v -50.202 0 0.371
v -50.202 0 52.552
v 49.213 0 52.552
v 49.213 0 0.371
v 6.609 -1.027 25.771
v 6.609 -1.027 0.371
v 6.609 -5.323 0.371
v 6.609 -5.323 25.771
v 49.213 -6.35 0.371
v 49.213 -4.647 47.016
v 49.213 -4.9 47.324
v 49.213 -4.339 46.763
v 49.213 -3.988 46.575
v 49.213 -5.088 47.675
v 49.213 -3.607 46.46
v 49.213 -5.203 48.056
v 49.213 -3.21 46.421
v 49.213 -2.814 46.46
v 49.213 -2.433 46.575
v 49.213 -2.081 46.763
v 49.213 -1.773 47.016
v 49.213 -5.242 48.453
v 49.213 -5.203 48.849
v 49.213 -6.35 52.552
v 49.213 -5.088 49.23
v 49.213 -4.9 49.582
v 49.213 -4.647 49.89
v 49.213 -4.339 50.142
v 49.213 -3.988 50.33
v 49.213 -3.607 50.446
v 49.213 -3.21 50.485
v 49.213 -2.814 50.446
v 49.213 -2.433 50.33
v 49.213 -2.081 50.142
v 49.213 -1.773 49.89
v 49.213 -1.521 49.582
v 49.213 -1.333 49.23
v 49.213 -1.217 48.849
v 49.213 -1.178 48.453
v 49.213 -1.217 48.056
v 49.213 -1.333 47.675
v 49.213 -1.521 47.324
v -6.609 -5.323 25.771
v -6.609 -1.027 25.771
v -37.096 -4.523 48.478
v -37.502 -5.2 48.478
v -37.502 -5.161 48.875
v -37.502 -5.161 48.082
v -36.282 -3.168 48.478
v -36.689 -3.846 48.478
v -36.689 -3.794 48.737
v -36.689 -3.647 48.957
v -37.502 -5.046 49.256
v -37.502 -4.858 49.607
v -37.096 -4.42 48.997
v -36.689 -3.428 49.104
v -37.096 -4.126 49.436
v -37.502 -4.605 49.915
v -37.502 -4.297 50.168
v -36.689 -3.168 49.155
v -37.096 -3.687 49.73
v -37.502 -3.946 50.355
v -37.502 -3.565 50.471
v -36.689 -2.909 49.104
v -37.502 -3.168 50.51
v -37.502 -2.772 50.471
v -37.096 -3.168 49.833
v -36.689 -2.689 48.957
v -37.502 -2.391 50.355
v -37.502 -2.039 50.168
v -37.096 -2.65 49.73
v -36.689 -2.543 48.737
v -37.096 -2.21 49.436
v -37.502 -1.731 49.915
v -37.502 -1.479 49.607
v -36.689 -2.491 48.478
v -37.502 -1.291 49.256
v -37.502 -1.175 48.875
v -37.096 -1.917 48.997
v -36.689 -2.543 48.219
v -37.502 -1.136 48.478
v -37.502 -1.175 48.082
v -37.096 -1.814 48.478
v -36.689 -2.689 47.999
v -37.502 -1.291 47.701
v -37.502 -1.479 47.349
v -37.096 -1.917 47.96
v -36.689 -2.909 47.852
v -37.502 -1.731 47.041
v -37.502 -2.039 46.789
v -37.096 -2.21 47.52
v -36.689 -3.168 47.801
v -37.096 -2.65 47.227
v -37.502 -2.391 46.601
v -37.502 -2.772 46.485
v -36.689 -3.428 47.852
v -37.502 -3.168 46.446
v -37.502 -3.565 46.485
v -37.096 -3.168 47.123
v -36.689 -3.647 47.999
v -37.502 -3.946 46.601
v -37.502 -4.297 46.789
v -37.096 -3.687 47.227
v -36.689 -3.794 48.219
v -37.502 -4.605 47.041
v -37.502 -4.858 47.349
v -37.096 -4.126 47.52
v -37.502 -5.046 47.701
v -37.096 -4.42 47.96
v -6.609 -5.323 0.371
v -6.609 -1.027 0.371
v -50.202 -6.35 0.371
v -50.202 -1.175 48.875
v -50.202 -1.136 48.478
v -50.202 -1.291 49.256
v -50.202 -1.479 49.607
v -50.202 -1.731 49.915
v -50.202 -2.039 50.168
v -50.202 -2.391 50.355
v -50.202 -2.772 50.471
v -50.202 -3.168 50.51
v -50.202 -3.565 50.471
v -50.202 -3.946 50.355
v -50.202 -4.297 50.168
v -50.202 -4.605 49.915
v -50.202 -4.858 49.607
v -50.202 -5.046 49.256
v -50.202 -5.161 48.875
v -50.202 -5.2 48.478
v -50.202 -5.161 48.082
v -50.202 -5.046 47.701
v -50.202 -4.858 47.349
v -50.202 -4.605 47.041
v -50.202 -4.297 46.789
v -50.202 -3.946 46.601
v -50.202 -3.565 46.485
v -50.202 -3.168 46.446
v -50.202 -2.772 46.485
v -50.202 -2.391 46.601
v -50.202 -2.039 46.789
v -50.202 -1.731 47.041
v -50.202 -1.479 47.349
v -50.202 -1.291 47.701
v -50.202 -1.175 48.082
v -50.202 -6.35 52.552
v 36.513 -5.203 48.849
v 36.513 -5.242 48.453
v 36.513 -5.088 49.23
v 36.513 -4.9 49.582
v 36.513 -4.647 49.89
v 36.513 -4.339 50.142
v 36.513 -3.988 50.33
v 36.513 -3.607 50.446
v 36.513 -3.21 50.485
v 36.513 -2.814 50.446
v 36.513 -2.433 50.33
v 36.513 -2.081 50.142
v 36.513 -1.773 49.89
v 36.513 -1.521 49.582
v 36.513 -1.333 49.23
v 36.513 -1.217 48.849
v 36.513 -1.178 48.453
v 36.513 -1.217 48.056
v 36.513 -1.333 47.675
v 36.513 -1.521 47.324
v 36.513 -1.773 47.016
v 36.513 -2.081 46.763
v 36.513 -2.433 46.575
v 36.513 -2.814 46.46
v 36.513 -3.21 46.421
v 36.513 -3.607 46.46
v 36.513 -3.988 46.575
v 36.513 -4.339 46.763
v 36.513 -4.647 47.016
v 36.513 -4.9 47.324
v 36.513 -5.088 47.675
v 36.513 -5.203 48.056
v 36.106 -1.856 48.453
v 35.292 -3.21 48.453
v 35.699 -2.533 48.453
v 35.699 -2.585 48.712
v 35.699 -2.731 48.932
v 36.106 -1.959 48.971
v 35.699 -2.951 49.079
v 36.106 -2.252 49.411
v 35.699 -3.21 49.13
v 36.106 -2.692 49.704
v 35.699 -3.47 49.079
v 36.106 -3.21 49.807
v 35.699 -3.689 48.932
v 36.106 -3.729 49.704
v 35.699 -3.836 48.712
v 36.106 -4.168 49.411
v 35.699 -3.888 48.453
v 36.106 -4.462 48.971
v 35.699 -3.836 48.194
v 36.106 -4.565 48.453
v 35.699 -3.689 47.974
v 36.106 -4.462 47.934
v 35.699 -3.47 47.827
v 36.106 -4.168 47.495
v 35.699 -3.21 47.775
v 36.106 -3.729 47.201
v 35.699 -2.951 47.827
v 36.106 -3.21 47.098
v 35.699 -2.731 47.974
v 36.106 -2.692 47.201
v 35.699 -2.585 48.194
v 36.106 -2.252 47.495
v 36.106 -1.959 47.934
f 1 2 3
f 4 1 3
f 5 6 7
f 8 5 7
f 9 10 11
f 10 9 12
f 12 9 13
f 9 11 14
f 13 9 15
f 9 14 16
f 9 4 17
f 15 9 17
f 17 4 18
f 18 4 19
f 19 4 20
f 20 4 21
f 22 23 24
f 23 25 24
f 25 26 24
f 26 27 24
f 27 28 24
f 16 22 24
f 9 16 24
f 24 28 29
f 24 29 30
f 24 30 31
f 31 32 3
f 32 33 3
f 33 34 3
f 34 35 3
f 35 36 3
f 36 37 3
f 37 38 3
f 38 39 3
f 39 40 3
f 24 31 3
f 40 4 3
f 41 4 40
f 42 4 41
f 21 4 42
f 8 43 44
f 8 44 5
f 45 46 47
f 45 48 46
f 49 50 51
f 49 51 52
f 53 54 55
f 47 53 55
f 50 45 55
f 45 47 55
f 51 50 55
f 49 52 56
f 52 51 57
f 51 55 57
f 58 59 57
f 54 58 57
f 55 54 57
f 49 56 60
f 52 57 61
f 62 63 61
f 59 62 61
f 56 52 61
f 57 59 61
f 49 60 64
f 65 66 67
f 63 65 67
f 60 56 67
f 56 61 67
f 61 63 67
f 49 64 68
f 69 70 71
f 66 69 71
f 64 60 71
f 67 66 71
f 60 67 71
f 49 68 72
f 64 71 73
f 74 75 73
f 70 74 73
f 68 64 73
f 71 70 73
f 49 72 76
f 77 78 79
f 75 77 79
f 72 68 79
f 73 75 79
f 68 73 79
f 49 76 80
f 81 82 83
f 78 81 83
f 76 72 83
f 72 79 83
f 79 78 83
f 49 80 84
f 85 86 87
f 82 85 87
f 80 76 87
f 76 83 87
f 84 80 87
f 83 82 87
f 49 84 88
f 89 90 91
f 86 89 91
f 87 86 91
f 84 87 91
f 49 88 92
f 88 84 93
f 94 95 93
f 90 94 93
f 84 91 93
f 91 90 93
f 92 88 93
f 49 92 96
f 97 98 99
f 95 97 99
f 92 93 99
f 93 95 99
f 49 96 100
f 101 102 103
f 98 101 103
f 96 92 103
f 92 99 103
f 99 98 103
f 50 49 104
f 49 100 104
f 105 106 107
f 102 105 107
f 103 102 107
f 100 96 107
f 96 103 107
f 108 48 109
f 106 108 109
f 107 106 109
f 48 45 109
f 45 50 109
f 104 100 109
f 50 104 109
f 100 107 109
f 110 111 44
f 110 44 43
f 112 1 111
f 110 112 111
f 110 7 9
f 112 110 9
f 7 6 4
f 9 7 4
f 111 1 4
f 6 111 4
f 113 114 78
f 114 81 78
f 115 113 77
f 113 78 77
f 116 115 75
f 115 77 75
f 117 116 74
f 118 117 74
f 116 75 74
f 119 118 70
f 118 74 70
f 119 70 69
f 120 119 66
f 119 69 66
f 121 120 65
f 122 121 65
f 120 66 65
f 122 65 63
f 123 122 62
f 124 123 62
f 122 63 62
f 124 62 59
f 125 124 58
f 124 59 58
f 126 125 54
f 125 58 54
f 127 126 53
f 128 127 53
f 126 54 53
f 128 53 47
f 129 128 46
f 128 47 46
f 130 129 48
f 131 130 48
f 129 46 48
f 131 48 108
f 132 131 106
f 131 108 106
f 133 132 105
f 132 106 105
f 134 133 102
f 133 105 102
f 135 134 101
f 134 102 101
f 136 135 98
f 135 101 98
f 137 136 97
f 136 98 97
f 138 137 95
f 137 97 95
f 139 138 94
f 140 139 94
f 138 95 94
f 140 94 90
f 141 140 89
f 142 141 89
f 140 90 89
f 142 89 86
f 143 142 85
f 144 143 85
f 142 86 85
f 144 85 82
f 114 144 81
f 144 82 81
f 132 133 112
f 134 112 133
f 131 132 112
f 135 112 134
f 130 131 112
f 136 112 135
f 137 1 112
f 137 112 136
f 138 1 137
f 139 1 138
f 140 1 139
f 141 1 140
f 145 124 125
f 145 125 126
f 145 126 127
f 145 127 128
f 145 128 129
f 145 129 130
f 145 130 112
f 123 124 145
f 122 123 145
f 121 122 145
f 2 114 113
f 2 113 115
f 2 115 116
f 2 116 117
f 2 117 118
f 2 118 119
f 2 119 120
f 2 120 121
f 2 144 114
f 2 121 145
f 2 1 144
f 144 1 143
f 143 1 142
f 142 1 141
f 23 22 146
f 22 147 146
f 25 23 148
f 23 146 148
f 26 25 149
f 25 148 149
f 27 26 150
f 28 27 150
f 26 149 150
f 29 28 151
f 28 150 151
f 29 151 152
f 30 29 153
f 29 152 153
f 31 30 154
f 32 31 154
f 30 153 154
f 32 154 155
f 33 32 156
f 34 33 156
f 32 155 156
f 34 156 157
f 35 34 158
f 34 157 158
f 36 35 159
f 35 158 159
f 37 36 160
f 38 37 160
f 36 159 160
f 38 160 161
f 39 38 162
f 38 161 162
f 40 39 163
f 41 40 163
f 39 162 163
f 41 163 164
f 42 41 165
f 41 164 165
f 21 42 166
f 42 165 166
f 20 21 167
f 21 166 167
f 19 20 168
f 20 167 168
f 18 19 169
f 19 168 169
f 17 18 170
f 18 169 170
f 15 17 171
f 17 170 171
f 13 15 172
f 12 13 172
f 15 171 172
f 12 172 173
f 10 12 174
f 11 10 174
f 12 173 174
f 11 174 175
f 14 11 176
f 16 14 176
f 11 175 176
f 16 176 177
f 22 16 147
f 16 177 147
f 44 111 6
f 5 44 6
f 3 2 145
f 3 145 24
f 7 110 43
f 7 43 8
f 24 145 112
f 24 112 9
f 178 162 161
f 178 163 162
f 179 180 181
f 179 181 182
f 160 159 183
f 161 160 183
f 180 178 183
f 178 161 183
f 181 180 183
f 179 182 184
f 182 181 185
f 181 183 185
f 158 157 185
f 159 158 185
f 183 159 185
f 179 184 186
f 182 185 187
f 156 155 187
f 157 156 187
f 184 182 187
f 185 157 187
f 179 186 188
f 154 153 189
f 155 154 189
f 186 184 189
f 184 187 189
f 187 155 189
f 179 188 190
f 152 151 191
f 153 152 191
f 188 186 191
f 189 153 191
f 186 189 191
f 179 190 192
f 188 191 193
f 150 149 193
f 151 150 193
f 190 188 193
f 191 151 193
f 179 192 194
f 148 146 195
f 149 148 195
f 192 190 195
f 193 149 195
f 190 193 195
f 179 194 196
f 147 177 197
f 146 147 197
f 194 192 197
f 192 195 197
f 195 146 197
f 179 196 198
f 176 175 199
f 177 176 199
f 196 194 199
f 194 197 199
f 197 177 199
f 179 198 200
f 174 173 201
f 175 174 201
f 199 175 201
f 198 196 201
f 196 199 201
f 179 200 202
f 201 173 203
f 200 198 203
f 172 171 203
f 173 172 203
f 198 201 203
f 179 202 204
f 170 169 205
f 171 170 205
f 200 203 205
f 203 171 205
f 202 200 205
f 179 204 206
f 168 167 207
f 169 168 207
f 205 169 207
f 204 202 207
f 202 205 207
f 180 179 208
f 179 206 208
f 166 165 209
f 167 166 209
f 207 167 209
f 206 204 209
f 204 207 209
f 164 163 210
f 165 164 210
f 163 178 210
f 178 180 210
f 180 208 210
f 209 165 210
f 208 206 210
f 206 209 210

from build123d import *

# Parameters (mm, degrees)
F0_W     = 99.4157642126
F0_H     = 52.1809085621
F1_DEPTH = 6.35
F4_D     = 4.064
F4_DEPTH = 12.7
F4_TIP   = 1.2209487779
F5_D     = 4.064
F5_DEPTH = 12.7
F5_TIP   = 1.2209487779
F6_W     = 13.2178254426
F6_H     = 4.296275205
F7_DEPTH = 25.4


with BuildPart() as f1:
    # F0 (on Front) → F1 (new body)
    with BuildSketch(Plane.XZ):
        with Locations((-0.4946067929, 26.4614112966)):
            Rectangle(F0_W, F0_H)
    extrude(amount=F1_DEPTH)

    # F4
    with Locations(Plane.YZ.offset(49.2132753134)):
        with Locations((-3.2103247941, 48.4527722001)):
            Hole(F4_D / 2, depth=F4_DEPTH)
            with Locations((0, 0, -(F4_DEPTH + F4_TIP / 2))):  # 118° drill point
                Cone(0, F4_D / 2, F4_TIP, mode=Mode.SUBTRACT)

    # F5
    with Locations(Plane(origin=(-50.2024888992, 0, 0), x_dir=(0, -1, 0), z_dir=(-1, 0, 0))):
        with Locations((3.1683039851, 48.47811535)):
            Hole(F5_D / 2, depth=F5_DEPTH)
            with Locations((0, 0, -(F5_DEPTH + F5_TIP / 2))):  # 118° drill point
                Cone(0, F5_D / 2, F5_TIP, mode=Mode.SUBTRACT)

    # F6 (on face) → F7 (cut)
    with BuildSketch(Plane(origin=(0, 0, 0.3709570155), x_dir=(1, 0, 0), z_dir=(0, 0, -1))):
        with Locations((0, 3.175)):
            Rectangle(F6_W, F6_H)
    extrude(amount=-F7_DEPTH, mode=Mode.SUBTRACT)


solid = f1.part
